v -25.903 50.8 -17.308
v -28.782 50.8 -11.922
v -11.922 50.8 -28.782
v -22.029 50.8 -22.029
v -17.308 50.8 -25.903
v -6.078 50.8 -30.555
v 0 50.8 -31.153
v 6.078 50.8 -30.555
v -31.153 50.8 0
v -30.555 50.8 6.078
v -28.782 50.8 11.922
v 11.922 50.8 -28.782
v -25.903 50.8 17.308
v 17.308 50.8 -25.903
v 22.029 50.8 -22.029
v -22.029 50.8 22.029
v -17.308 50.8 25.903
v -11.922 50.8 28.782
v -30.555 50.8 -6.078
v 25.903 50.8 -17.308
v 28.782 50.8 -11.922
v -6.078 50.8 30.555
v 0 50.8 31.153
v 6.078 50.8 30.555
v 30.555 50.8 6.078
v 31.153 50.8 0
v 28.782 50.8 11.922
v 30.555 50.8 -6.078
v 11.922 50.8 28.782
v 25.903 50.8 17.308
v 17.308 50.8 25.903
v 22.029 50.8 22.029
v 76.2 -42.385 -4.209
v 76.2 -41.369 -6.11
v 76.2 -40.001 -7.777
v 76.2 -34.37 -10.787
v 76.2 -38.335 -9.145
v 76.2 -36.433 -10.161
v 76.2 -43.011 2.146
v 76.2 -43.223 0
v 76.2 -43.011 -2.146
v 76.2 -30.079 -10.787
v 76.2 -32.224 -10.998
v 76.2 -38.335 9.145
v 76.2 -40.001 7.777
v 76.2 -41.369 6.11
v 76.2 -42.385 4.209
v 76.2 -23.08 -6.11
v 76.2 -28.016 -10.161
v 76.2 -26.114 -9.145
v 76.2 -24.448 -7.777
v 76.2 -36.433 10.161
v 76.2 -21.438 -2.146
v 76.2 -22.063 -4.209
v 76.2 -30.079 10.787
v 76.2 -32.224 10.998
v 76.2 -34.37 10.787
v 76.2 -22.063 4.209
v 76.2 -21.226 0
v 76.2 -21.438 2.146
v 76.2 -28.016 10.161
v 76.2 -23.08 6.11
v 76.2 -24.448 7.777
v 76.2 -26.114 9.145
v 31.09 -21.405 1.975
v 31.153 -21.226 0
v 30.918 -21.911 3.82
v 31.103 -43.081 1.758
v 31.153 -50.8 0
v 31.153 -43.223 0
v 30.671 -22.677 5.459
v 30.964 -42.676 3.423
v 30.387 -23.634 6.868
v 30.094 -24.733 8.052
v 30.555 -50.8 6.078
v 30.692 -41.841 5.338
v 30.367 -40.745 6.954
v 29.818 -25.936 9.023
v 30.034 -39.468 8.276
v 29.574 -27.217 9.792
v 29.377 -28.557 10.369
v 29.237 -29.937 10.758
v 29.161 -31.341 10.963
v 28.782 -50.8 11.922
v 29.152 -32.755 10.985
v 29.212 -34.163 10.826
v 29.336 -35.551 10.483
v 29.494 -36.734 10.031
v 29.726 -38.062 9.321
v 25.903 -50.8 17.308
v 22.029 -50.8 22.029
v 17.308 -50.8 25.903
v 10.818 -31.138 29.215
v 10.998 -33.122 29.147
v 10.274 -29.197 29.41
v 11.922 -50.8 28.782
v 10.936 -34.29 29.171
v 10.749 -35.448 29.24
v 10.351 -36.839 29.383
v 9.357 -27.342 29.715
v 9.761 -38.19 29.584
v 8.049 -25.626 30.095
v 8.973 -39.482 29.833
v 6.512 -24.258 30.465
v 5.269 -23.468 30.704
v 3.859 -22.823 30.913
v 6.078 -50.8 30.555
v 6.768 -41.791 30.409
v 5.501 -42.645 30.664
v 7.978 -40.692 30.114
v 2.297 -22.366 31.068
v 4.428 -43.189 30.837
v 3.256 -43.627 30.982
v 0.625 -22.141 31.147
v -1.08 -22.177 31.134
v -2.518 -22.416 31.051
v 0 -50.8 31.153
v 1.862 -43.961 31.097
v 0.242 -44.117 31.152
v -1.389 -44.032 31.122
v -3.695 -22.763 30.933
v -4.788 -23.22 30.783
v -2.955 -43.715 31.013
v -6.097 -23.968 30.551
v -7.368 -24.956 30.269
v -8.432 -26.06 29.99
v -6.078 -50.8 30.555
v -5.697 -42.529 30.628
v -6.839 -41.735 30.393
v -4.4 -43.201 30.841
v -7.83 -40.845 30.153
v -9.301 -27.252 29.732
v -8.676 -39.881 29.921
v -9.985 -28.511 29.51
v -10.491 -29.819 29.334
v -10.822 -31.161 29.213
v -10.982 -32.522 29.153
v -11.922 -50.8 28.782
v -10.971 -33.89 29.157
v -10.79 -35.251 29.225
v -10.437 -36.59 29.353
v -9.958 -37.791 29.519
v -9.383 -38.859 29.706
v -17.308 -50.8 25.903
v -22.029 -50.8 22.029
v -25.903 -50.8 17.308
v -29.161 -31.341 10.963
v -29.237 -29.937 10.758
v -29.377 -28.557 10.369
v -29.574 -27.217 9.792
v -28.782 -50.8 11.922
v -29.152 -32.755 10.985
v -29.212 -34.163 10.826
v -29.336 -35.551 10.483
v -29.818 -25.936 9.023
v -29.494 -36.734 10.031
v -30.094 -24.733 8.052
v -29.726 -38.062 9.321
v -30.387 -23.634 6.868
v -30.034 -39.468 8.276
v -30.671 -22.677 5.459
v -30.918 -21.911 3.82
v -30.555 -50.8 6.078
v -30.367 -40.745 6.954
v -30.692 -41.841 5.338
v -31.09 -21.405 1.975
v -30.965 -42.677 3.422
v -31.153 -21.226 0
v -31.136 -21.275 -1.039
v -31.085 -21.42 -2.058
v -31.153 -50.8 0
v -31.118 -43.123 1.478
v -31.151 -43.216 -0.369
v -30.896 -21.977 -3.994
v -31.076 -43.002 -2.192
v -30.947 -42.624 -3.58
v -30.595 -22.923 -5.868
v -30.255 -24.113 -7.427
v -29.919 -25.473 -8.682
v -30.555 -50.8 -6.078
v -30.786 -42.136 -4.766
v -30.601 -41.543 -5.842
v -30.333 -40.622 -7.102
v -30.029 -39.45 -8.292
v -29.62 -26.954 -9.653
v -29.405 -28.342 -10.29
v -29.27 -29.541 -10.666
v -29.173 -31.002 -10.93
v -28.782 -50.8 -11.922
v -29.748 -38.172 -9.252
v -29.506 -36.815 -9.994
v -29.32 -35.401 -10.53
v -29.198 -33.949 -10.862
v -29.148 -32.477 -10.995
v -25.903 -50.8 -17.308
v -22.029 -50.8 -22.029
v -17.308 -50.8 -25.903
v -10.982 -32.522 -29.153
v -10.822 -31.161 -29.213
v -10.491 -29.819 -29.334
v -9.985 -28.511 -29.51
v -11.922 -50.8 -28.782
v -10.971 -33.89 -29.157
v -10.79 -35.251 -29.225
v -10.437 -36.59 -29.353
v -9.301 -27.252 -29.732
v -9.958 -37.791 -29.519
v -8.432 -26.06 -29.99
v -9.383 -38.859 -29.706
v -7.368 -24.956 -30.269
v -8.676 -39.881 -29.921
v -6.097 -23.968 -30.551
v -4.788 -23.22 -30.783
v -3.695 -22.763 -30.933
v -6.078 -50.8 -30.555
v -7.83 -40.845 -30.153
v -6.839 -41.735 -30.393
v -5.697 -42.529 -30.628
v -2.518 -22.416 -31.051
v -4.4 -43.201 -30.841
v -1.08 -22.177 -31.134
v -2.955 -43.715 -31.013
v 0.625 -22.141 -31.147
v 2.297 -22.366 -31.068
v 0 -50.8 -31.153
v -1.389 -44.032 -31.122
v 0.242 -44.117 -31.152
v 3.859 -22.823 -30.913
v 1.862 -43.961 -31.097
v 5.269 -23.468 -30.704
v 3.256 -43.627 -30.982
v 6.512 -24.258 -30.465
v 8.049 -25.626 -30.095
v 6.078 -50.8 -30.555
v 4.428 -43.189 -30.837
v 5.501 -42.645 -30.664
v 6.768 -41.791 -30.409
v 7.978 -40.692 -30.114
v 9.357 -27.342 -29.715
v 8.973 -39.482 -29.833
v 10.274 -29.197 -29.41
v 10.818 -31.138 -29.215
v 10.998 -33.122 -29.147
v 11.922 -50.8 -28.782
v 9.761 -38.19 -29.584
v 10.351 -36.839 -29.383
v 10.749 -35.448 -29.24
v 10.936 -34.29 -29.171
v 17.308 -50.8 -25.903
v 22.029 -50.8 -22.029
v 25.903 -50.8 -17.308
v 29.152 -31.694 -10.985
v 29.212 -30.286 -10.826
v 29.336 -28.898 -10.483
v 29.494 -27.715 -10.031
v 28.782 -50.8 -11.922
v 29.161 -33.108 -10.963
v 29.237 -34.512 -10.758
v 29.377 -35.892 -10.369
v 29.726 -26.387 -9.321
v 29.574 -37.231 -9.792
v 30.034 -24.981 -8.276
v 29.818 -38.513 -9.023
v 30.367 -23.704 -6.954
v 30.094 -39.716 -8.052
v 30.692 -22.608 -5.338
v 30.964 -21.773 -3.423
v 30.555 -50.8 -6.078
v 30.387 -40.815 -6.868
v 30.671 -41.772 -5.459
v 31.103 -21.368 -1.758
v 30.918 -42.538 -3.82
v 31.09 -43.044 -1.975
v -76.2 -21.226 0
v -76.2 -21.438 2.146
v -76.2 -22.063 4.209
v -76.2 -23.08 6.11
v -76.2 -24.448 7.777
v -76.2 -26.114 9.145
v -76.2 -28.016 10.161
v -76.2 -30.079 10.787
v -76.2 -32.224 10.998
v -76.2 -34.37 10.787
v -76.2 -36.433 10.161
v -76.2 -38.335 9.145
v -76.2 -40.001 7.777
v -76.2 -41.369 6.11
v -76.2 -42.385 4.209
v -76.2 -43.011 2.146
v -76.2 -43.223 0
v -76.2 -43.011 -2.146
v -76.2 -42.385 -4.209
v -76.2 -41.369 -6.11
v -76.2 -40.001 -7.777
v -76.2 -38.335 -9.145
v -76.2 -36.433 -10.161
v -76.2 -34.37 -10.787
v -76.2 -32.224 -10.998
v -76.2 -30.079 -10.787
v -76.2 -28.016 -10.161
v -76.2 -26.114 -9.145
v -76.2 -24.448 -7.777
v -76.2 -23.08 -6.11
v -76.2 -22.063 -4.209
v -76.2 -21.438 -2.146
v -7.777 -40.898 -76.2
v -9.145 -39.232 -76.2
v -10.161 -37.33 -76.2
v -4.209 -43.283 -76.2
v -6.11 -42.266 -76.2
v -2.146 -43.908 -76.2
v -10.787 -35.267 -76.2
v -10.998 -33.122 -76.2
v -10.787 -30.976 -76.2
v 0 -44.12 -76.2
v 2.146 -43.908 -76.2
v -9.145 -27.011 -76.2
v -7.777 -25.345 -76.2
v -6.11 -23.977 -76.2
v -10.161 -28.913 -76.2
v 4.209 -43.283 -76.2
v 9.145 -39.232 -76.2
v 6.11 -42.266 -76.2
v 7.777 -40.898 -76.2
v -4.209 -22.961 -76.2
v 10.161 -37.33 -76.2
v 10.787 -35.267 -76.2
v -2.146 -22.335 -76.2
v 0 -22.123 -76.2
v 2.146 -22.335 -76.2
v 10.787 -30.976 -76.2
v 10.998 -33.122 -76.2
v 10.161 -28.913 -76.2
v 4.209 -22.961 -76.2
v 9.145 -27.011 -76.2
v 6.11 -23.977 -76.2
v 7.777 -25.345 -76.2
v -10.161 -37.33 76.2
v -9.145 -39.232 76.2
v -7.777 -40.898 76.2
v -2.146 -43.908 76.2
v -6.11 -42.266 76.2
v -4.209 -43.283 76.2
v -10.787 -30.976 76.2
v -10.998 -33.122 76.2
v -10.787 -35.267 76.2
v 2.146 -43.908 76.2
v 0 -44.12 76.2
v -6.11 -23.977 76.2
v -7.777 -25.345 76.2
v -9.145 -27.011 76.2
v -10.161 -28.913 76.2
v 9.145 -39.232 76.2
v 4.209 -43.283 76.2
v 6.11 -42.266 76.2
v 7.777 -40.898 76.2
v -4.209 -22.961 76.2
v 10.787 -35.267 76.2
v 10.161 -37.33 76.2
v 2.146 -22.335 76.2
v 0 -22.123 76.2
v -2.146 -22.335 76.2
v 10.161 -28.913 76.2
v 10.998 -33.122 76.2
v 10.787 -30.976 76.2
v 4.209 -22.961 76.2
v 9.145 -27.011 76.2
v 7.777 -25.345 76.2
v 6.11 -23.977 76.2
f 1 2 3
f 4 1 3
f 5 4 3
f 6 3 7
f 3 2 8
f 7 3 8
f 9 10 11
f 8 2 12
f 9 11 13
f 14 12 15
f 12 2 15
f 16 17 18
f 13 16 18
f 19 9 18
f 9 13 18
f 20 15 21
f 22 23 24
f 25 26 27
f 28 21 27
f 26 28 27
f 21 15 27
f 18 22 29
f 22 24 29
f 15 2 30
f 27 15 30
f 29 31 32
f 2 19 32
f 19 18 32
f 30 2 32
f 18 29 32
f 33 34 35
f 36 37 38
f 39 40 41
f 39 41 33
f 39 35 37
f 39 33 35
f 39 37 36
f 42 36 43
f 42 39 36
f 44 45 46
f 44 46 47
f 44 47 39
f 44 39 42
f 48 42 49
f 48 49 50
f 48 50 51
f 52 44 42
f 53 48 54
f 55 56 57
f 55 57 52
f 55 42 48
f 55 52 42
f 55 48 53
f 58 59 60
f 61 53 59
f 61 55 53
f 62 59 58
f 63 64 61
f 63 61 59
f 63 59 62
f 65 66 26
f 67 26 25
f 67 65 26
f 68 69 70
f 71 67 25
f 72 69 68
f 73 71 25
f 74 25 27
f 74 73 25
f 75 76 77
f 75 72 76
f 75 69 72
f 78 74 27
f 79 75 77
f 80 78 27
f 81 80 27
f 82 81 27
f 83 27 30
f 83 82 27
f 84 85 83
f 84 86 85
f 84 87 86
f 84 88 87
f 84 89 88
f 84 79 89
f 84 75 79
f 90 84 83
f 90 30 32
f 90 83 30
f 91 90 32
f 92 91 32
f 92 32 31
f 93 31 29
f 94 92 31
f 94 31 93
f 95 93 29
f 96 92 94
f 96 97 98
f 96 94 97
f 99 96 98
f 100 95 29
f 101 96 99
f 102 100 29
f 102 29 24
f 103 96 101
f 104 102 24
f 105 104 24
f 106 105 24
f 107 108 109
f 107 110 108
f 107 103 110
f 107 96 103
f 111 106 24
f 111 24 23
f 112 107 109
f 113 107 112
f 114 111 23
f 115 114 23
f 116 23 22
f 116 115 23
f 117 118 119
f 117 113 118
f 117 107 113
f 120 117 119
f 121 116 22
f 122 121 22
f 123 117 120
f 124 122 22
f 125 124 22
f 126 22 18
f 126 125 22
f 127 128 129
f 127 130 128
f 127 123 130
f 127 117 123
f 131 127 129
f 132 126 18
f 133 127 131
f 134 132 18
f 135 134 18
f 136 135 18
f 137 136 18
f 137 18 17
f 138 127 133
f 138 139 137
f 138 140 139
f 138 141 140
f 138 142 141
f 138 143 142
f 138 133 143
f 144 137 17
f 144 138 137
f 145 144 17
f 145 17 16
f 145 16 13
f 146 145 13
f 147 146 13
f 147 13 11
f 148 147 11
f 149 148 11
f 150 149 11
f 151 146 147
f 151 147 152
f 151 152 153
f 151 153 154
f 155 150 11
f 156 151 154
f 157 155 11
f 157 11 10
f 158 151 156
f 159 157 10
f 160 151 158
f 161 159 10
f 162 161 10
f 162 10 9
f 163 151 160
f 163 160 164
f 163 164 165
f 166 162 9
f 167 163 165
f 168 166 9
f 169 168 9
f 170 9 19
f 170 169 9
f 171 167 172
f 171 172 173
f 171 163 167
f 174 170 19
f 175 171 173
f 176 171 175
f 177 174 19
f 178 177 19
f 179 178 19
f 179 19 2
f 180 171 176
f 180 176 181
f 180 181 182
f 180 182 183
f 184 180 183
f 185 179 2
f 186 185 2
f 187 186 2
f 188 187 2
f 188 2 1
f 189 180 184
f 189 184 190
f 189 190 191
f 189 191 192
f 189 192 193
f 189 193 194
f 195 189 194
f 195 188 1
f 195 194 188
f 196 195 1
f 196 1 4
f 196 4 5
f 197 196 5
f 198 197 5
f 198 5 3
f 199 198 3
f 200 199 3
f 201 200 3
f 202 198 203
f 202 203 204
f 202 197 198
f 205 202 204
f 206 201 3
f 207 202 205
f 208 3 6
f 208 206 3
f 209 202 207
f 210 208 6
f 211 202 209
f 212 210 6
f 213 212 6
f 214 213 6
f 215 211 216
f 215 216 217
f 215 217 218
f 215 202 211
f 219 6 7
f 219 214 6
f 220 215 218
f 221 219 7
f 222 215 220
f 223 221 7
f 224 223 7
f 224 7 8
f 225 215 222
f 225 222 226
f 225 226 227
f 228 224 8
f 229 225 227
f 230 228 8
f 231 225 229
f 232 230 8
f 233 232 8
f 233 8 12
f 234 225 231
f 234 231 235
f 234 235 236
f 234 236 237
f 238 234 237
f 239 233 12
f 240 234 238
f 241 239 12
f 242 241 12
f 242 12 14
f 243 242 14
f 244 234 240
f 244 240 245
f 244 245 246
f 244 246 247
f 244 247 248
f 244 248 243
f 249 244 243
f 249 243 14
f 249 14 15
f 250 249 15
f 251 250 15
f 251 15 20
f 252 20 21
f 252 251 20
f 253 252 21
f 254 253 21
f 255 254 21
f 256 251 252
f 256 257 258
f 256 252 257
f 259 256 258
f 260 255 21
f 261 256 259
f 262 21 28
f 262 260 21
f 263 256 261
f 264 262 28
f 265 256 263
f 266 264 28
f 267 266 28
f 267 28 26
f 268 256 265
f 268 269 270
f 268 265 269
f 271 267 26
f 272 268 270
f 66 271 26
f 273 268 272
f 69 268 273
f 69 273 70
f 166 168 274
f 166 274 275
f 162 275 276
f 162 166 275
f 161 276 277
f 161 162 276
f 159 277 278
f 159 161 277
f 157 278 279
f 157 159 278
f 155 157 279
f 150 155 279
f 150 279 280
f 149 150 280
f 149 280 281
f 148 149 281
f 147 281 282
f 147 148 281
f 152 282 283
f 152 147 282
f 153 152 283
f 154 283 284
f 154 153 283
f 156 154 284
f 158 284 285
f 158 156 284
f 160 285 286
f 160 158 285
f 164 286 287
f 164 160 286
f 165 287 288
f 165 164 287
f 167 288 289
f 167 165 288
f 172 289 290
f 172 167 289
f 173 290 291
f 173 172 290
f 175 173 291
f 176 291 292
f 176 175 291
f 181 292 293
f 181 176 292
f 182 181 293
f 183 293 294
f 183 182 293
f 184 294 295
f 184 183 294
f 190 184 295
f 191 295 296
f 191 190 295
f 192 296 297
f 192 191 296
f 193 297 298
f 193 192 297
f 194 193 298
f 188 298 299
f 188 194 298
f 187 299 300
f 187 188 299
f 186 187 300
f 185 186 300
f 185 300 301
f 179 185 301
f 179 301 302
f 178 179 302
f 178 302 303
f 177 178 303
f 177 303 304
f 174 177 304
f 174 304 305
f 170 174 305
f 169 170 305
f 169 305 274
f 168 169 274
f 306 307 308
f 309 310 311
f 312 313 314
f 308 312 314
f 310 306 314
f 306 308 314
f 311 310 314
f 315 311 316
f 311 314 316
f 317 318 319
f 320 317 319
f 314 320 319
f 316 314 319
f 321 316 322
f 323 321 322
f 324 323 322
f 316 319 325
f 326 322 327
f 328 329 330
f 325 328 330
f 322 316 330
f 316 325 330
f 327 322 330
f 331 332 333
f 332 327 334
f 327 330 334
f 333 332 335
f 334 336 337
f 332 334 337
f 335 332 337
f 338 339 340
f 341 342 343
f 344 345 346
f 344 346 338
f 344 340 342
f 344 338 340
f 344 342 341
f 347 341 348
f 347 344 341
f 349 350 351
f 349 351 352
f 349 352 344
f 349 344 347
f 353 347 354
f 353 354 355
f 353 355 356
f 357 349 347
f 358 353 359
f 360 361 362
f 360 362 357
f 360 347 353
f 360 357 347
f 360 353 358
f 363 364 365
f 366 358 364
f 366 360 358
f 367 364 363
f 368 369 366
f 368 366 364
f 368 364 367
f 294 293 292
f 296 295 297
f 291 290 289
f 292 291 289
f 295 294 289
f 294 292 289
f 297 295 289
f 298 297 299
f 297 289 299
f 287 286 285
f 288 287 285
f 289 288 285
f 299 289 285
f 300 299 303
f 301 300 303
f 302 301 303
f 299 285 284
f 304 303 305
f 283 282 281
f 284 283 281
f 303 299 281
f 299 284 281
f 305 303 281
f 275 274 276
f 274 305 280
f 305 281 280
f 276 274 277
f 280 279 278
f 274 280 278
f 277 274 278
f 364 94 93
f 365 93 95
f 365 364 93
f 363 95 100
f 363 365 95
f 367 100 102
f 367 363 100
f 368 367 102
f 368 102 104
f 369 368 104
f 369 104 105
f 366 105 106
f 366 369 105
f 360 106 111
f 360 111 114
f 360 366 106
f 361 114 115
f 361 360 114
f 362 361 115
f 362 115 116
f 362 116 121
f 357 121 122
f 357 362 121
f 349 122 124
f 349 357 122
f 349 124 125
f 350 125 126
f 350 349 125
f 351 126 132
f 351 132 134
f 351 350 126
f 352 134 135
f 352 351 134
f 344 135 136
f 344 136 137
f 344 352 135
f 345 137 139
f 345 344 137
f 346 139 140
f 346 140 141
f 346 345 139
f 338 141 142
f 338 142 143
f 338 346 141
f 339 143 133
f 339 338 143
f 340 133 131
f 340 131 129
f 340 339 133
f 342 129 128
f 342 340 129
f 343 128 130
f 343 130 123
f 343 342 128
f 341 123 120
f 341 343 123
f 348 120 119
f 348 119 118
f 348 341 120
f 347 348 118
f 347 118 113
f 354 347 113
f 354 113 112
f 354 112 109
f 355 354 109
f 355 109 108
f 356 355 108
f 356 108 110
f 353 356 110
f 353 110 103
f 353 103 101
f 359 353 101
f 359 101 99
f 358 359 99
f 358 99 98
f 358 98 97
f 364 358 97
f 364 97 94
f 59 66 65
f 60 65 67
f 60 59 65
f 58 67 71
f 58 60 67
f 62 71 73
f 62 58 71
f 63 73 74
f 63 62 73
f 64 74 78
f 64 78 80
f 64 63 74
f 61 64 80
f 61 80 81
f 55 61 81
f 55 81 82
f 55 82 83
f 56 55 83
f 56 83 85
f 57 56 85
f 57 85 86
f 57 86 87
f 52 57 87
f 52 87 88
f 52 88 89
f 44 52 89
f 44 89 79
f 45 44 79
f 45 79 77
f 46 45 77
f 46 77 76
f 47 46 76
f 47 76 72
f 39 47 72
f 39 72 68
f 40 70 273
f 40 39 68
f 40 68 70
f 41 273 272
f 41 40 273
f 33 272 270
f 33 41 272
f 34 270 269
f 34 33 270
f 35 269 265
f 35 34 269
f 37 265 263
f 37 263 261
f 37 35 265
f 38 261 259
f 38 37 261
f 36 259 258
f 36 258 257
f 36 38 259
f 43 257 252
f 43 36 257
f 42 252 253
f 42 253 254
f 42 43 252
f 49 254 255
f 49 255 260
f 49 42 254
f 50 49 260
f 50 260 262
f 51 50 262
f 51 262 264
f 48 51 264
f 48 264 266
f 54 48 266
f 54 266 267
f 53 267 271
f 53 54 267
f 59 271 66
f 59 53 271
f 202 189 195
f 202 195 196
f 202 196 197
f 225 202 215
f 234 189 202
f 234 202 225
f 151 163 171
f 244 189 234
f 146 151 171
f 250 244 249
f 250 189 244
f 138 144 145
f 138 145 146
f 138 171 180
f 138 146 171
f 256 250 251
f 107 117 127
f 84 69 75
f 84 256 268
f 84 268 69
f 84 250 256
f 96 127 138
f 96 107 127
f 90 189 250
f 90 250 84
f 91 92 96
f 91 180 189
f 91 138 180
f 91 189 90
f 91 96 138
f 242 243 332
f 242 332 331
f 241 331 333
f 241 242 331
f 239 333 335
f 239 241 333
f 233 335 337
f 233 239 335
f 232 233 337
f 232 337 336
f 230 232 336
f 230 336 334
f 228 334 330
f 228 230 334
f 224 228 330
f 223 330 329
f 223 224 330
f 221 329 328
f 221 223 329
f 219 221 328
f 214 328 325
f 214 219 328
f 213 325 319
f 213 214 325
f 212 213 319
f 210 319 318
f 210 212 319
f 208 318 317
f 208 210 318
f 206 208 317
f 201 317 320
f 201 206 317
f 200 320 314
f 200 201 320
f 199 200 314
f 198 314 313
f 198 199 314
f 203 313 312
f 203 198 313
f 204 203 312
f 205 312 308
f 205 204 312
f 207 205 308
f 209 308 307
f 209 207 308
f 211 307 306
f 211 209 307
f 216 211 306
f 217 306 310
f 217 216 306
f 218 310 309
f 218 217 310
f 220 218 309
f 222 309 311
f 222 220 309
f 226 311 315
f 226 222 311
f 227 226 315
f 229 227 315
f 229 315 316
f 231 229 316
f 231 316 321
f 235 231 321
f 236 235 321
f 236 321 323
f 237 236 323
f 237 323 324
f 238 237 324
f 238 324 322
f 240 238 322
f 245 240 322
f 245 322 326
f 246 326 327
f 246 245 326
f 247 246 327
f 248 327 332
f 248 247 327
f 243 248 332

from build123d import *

# Parameters (mm, degrees)
F0_R     = 31.1531
F1_DEPTH = 50.8
F2_R     = 10.9982
F4_DEPTH = 76.2
F3_R     = 10.9982
F5_DEPTH = 76.2


with BuildPart() as f1:
    # F0 (on Front) → F1 (new body, symmetric)
    with BuildSketch(Plane.XZ):
        Circle(F0_R)
    extrude(amount=F1_DEPTH, both=True)

    # F2 (on Right) → F4 (join, symmetric)
    with BuildSketch(Plane.YZ):
        with Locations((-32.224476, 0)):
            Circle(F2_R)
    extrude(amount=F4_DEPTH, both=True)

    # F3 (on Top) → F5 (join, symmetric)
    with BuildSketch(Plane.XY):
        with Locations((0, -33.121577)):
            Circle(F3_R)
    extrude(amount=F5_DEPTH, both=True)


solid = f1.part
